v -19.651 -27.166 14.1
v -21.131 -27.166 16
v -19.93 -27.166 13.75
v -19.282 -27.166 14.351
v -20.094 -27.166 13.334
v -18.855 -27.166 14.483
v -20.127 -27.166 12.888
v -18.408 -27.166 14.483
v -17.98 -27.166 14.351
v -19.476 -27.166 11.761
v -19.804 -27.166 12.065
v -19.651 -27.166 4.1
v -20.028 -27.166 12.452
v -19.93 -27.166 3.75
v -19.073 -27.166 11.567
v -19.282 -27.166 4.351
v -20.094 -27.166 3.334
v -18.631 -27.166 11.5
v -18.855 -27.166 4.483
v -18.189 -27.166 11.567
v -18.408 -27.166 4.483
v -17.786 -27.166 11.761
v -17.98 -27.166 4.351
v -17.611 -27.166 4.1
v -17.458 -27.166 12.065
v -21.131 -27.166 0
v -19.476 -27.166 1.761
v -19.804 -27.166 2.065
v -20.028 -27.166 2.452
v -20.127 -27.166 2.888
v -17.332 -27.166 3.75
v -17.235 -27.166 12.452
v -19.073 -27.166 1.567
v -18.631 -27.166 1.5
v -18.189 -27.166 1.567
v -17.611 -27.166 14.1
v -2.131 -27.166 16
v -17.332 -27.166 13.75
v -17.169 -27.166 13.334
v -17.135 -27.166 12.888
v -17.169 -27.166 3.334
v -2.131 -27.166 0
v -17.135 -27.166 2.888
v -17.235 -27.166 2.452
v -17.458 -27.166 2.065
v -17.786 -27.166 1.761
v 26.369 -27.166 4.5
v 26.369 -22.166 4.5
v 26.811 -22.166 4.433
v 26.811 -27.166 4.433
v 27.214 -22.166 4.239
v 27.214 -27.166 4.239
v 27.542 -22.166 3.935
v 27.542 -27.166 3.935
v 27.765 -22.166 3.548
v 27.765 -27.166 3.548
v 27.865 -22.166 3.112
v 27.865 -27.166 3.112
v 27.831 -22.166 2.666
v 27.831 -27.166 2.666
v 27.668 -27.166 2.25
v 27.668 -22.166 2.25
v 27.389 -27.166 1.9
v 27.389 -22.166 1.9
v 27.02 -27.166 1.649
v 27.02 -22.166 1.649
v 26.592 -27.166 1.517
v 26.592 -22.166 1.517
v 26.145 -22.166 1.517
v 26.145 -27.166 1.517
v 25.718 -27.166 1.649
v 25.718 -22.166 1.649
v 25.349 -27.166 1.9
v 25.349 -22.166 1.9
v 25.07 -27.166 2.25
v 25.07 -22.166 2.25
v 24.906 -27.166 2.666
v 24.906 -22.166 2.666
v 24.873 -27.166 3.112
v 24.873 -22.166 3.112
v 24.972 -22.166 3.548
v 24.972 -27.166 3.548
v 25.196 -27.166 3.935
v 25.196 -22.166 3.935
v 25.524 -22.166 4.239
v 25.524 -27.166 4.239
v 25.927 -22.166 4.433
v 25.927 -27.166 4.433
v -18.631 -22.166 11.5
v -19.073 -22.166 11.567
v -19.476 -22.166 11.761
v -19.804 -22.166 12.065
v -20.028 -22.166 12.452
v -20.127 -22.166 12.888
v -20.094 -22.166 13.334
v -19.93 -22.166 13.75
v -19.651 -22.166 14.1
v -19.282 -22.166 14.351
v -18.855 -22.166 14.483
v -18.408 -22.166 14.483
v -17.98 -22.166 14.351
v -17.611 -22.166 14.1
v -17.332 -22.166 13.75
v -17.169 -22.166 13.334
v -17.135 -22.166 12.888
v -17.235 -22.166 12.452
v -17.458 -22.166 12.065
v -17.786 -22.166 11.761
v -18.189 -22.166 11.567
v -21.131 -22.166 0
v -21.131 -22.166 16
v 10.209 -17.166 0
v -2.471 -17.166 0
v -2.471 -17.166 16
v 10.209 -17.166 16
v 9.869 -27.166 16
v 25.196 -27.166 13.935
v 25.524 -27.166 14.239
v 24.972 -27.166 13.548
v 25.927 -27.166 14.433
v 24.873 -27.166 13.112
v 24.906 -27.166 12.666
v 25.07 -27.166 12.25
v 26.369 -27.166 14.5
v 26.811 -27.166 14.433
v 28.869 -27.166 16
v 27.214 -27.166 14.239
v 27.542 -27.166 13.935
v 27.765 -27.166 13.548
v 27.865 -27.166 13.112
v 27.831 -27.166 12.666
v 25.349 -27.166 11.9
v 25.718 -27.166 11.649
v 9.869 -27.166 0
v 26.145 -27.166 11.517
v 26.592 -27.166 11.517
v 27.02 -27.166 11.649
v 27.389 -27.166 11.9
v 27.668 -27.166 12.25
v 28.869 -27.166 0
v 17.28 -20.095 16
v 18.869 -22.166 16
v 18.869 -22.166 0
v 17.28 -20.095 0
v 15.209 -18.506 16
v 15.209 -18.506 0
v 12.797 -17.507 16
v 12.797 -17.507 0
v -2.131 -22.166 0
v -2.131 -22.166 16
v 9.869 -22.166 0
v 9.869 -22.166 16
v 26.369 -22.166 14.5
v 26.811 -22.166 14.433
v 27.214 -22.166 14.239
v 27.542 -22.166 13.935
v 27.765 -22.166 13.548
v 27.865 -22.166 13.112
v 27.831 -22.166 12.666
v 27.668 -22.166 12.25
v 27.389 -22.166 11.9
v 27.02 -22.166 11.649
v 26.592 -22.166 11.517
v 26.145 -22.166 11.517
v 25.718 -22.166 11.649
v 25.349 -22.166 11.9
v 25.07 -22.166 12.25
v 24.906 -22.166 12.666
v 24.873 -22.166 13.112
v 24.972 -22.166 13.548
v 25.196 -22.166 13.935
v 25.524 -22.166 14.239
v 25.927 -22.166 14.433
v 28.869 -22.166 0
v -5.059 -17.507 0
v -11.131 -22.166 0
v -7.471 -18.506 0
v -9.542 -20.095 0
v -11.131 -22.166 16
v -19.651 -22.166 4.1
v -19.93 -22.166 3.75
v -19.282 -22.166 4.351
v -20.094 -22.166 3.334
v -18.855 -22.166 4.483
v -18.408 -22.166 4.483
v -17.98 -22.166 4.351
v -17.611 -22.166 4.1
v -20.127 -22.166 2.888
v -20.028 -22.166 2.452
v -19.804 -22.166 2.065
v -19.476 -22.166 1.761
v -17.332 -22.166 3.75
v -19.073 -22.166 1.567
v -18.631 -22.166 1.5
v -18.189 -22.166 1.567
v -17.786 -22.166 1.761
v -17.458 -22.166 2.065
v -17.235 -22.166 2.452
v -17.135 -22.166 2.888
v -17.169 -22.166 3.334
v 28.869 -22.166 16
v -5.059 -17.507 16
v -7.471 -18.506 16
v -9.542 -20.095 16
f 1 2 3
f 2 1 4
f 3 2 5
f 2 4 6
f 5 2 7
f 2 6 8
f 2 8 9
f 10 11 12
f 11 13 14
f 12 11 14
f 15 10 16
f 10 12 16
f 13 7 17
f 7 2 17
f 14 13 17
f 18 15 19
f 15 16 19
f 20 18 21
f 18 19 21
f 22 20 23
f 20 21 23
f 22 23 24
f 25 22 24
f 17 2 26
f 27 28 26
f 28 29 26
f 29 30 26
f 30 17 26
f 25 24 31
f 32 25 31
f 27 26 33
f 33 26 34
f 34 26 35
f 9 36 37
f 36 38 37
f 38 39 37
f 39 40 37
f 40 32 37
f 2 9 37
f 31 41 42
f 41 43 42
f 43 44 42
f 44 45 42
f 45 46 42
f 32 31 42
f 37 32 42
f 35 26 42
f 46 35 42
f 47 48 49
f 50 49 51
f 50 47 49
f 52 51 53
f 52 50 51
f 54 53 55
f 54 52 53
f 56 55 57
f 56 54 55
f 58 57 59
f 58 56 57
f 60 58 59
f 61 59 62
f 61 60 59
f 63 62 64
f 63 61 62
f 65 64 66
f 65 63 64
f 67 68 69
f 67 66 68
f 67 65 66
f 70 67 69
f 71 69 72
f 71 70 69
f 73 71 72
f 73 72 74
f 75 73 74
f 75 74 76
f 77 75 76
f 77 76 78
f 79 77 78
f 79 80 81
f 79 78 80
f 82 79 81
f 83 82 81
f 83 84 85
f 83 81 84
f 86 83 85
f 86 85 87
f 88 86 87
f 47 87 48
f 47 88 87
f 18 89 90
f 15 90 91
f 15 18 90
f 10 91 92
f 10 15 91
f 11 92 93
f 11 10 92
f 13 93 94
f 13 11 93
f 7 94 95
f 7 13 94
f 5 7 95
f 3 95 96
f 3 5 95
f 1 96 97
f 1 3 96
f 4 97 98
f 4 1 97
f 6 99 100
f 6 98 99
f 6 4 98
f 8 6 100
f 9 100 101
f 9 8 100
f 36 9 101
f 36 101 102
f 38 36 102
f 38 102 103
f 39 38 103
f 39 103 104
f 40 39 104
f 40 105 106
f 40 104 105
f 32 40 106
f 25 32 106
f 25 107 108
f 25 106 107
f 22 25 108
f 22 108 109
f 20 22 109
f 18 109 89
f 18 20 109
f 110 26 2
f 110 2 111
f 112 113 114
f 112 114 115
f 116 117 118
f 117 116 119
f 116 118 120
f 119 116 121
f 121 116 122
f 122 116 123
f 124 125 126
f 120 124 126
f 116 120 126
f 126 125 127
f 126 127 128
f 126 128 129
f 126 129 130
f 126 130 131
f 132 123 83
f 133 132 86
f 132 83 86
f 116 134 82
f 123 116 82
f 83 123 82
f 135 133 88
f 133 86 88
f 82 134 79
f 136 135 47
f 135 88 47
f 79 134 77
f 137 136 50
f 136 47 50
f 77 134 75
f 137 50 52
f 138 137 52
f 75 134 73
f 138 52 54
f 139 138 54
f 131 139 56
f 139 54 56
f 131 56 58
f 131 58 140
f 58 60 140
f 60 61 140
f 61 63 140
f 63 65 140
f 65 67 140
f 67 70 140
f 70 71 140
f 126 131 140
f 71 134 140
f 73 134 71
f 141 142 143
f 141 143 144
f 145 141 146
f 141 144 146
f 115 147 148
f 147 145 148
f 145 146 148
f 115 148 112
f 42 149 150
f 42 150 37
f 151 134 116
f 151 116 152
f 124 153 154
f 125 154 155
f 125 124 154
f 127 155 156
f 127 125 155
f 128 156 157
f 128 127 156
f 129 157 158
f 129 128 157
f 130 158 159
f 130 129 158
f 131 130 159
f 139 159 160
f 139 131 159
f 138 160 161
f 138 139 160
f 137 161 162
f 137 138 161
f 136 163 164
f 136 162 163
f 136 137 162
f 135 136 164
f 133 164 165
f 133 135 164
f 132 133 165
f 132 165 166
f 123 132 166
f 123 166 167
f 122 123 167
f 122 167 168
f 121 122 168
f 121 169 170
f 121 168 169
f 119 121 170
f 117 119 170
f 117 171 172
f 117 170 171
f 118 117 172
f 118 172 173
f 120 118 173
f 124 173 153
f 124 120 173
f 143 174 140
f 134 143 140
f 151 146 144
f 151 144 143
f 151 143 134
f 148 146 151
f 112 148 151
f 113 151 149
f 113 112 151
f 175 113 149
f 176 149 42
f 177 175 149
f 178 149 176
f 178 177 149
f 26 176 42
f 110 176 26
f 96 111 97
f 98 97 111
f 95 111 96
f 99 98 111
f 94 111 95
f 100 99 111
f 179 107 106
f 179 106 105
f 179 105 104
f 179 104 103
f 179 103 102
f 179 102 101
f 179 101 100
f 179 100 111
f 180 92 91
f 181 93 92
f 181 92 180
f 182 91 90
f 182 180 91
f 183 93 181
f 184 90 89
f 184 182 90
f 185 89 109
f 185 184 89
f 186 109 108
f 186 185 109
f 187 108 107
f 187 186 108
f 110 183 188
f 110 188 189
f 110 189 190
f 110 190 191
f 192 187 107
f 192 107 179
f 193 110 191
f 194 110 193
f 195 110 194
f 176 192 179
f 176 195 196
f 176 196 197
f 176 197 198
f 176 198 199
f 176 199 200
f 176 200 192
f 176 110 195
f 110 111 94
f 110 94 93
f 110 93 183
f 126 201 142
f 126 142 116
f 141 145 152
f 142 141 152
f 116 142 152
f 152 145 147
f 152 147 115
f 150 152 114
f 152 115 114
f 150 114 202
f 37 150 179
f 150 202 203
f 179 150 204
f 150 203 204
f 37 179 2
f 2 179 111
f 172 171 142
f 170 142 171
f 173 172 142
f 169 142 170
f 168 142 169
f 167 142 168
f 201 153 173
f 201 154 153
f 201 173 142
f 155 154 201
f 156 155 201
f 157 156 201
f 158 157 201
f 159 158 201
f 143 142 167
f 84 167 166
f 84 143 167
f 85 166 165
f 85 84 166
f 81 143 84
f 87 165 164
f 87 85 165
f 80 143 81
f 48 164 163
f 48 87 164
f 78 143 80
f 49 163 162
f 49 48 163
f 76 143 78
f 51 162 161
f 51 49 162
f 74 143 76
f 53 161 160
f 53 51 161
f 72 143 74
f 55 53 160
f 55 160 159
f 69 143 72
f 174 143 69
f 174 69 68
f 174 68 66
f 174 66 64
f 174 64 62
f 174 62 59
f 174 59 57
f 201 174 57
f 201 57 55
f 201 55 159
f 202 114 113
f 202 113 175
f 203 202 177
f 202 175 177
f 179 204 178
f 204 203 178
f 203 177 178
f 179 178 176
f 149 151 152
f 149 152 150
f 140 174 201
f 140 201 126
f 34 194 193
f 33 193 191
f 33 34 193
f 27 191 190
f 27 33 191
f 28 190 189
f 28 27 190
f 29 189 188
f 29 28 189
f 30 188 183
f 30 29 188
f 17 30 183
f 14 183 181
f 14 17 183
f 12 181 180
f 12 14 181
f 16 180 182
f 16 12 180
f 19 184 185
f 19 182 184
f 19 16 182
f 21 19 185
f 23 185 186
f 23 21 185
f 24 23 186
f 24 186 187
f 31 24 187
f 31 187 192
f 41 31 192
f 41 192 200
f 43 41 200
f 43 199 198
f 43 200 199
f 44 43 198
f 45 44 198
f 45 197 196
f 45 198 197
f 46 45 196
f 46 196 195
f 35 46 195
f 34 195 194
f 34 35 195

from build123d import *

# Parameters (mm, degrees)
BOSS_EXTRUDE1_DEPTH = 16
SKETCH14_R          = 1.5
CUT_EXTRUDE13_DEPTH = 50
FILLET1_R           = 10


with BuildPart() as part:
    # Sketch7 → Boss-Extrude1 (new body)
    with BuildSketch(Plane.XY):
        Polygon((9.868798372, -27.16601268), (9.868798372, -22.16601268), (-2.131201628, -22.16601268), (-2.131201628, -27.16601268), (-8.131201628, -27.16601268), (-21.131201628, -27.16601268), (-21.131201628, -22.16601268), (-11.131201628, -22.16601268), (-11.131201628, -17.16601268), (18.868798372, -17.16601268), (18.868798372, -22.16601268), (28.868798372, -22.16601268), (28.868798372, -27.16601268), (15.868798372, -27.16601268), align=None)
    extrude(amount=BOSS_EXTRUDE1_DEPTH)

    # Sketch14 → Cut-Extrude13 (cut)
    with BuildSketch(Plane(origin=(0, -27.16601268, 0), x_dir=(1, 0, 0), z_dir=(0, 1, 0))):
        with Locations(Location((-18.631201628, -3, 0), (0, 0, 90))):
            Circle(SKETCH14_R)
        with Locations(Location((-18.631201628, -13, 0), (0, 0, 90))):
            Circle(SKETCH14_R)
        with Locations(Location((26.368798372, -3, 0), (0, 0, 270))):
            Circle(SKETCH14_R)
        with Locations(Location((26.368798372, -13, 0), (0, 0, 270))):
            Circle(SKETCH14_R)
    extrude(amount=CUT_EXTRUDE13_DEPTH, mode=Mode.SUBTRACT)

    # Fillet1
    # the kernel refuses this fillet: 10 mm, written as the material it takes off along each edge
    with BuildSketch(Plane(origin=(-11.131201628, -17.16601268, -21.650635095), x_dir=(0, -1, 0), z_dir=(0, 0, 1))) as fillet1_piece_1:
        with BuildLine():
            CenterArc((10, 8.660254038), FILLET1_R, 180, 60)
            Line((0, 8.660254038), (-0.2, 8.660254038))
            Line((-0.2, 8.660254038), (-0.2, 0))
            Line((-0.2, 0), (0, -0.2))
            ThreePointArc((0, -0.2), (2.5, -0.2), (4.9, -0.173205081))
            Line((4.9, -0.173205081), (5, 0))
        make_face()
    extrude(amount=59.301270189, mode=Mode.SUBTRACT)
    with BuildSketch(Plane(origin=(18.868798372, -17.16601268, -21.650635095), x_dir=(-1, 0, 0), z_dir=(0, 0, 1))) as fillet1_piece_2:
        with BuildLine():
            CenterArc((8.660254038, 10), FILLET1_R, 210, 60)
            Line((0, 5), (-0.173205081, 4.9))
            ThreePointArc((-0.173205081, 4.9), (-0.2, 2.5), (-0.2, 0))
            Line((-0.2, 0), (0, -0.2))
            Line((0, -0.2), (8.660254038, -0.2))
            Line((8.660254038, -0.2), (8.660254038, 0))
        make_face()
    extrude(amount=59.301270189, mode=Mode.SUBTRACT)


solid = part.part
